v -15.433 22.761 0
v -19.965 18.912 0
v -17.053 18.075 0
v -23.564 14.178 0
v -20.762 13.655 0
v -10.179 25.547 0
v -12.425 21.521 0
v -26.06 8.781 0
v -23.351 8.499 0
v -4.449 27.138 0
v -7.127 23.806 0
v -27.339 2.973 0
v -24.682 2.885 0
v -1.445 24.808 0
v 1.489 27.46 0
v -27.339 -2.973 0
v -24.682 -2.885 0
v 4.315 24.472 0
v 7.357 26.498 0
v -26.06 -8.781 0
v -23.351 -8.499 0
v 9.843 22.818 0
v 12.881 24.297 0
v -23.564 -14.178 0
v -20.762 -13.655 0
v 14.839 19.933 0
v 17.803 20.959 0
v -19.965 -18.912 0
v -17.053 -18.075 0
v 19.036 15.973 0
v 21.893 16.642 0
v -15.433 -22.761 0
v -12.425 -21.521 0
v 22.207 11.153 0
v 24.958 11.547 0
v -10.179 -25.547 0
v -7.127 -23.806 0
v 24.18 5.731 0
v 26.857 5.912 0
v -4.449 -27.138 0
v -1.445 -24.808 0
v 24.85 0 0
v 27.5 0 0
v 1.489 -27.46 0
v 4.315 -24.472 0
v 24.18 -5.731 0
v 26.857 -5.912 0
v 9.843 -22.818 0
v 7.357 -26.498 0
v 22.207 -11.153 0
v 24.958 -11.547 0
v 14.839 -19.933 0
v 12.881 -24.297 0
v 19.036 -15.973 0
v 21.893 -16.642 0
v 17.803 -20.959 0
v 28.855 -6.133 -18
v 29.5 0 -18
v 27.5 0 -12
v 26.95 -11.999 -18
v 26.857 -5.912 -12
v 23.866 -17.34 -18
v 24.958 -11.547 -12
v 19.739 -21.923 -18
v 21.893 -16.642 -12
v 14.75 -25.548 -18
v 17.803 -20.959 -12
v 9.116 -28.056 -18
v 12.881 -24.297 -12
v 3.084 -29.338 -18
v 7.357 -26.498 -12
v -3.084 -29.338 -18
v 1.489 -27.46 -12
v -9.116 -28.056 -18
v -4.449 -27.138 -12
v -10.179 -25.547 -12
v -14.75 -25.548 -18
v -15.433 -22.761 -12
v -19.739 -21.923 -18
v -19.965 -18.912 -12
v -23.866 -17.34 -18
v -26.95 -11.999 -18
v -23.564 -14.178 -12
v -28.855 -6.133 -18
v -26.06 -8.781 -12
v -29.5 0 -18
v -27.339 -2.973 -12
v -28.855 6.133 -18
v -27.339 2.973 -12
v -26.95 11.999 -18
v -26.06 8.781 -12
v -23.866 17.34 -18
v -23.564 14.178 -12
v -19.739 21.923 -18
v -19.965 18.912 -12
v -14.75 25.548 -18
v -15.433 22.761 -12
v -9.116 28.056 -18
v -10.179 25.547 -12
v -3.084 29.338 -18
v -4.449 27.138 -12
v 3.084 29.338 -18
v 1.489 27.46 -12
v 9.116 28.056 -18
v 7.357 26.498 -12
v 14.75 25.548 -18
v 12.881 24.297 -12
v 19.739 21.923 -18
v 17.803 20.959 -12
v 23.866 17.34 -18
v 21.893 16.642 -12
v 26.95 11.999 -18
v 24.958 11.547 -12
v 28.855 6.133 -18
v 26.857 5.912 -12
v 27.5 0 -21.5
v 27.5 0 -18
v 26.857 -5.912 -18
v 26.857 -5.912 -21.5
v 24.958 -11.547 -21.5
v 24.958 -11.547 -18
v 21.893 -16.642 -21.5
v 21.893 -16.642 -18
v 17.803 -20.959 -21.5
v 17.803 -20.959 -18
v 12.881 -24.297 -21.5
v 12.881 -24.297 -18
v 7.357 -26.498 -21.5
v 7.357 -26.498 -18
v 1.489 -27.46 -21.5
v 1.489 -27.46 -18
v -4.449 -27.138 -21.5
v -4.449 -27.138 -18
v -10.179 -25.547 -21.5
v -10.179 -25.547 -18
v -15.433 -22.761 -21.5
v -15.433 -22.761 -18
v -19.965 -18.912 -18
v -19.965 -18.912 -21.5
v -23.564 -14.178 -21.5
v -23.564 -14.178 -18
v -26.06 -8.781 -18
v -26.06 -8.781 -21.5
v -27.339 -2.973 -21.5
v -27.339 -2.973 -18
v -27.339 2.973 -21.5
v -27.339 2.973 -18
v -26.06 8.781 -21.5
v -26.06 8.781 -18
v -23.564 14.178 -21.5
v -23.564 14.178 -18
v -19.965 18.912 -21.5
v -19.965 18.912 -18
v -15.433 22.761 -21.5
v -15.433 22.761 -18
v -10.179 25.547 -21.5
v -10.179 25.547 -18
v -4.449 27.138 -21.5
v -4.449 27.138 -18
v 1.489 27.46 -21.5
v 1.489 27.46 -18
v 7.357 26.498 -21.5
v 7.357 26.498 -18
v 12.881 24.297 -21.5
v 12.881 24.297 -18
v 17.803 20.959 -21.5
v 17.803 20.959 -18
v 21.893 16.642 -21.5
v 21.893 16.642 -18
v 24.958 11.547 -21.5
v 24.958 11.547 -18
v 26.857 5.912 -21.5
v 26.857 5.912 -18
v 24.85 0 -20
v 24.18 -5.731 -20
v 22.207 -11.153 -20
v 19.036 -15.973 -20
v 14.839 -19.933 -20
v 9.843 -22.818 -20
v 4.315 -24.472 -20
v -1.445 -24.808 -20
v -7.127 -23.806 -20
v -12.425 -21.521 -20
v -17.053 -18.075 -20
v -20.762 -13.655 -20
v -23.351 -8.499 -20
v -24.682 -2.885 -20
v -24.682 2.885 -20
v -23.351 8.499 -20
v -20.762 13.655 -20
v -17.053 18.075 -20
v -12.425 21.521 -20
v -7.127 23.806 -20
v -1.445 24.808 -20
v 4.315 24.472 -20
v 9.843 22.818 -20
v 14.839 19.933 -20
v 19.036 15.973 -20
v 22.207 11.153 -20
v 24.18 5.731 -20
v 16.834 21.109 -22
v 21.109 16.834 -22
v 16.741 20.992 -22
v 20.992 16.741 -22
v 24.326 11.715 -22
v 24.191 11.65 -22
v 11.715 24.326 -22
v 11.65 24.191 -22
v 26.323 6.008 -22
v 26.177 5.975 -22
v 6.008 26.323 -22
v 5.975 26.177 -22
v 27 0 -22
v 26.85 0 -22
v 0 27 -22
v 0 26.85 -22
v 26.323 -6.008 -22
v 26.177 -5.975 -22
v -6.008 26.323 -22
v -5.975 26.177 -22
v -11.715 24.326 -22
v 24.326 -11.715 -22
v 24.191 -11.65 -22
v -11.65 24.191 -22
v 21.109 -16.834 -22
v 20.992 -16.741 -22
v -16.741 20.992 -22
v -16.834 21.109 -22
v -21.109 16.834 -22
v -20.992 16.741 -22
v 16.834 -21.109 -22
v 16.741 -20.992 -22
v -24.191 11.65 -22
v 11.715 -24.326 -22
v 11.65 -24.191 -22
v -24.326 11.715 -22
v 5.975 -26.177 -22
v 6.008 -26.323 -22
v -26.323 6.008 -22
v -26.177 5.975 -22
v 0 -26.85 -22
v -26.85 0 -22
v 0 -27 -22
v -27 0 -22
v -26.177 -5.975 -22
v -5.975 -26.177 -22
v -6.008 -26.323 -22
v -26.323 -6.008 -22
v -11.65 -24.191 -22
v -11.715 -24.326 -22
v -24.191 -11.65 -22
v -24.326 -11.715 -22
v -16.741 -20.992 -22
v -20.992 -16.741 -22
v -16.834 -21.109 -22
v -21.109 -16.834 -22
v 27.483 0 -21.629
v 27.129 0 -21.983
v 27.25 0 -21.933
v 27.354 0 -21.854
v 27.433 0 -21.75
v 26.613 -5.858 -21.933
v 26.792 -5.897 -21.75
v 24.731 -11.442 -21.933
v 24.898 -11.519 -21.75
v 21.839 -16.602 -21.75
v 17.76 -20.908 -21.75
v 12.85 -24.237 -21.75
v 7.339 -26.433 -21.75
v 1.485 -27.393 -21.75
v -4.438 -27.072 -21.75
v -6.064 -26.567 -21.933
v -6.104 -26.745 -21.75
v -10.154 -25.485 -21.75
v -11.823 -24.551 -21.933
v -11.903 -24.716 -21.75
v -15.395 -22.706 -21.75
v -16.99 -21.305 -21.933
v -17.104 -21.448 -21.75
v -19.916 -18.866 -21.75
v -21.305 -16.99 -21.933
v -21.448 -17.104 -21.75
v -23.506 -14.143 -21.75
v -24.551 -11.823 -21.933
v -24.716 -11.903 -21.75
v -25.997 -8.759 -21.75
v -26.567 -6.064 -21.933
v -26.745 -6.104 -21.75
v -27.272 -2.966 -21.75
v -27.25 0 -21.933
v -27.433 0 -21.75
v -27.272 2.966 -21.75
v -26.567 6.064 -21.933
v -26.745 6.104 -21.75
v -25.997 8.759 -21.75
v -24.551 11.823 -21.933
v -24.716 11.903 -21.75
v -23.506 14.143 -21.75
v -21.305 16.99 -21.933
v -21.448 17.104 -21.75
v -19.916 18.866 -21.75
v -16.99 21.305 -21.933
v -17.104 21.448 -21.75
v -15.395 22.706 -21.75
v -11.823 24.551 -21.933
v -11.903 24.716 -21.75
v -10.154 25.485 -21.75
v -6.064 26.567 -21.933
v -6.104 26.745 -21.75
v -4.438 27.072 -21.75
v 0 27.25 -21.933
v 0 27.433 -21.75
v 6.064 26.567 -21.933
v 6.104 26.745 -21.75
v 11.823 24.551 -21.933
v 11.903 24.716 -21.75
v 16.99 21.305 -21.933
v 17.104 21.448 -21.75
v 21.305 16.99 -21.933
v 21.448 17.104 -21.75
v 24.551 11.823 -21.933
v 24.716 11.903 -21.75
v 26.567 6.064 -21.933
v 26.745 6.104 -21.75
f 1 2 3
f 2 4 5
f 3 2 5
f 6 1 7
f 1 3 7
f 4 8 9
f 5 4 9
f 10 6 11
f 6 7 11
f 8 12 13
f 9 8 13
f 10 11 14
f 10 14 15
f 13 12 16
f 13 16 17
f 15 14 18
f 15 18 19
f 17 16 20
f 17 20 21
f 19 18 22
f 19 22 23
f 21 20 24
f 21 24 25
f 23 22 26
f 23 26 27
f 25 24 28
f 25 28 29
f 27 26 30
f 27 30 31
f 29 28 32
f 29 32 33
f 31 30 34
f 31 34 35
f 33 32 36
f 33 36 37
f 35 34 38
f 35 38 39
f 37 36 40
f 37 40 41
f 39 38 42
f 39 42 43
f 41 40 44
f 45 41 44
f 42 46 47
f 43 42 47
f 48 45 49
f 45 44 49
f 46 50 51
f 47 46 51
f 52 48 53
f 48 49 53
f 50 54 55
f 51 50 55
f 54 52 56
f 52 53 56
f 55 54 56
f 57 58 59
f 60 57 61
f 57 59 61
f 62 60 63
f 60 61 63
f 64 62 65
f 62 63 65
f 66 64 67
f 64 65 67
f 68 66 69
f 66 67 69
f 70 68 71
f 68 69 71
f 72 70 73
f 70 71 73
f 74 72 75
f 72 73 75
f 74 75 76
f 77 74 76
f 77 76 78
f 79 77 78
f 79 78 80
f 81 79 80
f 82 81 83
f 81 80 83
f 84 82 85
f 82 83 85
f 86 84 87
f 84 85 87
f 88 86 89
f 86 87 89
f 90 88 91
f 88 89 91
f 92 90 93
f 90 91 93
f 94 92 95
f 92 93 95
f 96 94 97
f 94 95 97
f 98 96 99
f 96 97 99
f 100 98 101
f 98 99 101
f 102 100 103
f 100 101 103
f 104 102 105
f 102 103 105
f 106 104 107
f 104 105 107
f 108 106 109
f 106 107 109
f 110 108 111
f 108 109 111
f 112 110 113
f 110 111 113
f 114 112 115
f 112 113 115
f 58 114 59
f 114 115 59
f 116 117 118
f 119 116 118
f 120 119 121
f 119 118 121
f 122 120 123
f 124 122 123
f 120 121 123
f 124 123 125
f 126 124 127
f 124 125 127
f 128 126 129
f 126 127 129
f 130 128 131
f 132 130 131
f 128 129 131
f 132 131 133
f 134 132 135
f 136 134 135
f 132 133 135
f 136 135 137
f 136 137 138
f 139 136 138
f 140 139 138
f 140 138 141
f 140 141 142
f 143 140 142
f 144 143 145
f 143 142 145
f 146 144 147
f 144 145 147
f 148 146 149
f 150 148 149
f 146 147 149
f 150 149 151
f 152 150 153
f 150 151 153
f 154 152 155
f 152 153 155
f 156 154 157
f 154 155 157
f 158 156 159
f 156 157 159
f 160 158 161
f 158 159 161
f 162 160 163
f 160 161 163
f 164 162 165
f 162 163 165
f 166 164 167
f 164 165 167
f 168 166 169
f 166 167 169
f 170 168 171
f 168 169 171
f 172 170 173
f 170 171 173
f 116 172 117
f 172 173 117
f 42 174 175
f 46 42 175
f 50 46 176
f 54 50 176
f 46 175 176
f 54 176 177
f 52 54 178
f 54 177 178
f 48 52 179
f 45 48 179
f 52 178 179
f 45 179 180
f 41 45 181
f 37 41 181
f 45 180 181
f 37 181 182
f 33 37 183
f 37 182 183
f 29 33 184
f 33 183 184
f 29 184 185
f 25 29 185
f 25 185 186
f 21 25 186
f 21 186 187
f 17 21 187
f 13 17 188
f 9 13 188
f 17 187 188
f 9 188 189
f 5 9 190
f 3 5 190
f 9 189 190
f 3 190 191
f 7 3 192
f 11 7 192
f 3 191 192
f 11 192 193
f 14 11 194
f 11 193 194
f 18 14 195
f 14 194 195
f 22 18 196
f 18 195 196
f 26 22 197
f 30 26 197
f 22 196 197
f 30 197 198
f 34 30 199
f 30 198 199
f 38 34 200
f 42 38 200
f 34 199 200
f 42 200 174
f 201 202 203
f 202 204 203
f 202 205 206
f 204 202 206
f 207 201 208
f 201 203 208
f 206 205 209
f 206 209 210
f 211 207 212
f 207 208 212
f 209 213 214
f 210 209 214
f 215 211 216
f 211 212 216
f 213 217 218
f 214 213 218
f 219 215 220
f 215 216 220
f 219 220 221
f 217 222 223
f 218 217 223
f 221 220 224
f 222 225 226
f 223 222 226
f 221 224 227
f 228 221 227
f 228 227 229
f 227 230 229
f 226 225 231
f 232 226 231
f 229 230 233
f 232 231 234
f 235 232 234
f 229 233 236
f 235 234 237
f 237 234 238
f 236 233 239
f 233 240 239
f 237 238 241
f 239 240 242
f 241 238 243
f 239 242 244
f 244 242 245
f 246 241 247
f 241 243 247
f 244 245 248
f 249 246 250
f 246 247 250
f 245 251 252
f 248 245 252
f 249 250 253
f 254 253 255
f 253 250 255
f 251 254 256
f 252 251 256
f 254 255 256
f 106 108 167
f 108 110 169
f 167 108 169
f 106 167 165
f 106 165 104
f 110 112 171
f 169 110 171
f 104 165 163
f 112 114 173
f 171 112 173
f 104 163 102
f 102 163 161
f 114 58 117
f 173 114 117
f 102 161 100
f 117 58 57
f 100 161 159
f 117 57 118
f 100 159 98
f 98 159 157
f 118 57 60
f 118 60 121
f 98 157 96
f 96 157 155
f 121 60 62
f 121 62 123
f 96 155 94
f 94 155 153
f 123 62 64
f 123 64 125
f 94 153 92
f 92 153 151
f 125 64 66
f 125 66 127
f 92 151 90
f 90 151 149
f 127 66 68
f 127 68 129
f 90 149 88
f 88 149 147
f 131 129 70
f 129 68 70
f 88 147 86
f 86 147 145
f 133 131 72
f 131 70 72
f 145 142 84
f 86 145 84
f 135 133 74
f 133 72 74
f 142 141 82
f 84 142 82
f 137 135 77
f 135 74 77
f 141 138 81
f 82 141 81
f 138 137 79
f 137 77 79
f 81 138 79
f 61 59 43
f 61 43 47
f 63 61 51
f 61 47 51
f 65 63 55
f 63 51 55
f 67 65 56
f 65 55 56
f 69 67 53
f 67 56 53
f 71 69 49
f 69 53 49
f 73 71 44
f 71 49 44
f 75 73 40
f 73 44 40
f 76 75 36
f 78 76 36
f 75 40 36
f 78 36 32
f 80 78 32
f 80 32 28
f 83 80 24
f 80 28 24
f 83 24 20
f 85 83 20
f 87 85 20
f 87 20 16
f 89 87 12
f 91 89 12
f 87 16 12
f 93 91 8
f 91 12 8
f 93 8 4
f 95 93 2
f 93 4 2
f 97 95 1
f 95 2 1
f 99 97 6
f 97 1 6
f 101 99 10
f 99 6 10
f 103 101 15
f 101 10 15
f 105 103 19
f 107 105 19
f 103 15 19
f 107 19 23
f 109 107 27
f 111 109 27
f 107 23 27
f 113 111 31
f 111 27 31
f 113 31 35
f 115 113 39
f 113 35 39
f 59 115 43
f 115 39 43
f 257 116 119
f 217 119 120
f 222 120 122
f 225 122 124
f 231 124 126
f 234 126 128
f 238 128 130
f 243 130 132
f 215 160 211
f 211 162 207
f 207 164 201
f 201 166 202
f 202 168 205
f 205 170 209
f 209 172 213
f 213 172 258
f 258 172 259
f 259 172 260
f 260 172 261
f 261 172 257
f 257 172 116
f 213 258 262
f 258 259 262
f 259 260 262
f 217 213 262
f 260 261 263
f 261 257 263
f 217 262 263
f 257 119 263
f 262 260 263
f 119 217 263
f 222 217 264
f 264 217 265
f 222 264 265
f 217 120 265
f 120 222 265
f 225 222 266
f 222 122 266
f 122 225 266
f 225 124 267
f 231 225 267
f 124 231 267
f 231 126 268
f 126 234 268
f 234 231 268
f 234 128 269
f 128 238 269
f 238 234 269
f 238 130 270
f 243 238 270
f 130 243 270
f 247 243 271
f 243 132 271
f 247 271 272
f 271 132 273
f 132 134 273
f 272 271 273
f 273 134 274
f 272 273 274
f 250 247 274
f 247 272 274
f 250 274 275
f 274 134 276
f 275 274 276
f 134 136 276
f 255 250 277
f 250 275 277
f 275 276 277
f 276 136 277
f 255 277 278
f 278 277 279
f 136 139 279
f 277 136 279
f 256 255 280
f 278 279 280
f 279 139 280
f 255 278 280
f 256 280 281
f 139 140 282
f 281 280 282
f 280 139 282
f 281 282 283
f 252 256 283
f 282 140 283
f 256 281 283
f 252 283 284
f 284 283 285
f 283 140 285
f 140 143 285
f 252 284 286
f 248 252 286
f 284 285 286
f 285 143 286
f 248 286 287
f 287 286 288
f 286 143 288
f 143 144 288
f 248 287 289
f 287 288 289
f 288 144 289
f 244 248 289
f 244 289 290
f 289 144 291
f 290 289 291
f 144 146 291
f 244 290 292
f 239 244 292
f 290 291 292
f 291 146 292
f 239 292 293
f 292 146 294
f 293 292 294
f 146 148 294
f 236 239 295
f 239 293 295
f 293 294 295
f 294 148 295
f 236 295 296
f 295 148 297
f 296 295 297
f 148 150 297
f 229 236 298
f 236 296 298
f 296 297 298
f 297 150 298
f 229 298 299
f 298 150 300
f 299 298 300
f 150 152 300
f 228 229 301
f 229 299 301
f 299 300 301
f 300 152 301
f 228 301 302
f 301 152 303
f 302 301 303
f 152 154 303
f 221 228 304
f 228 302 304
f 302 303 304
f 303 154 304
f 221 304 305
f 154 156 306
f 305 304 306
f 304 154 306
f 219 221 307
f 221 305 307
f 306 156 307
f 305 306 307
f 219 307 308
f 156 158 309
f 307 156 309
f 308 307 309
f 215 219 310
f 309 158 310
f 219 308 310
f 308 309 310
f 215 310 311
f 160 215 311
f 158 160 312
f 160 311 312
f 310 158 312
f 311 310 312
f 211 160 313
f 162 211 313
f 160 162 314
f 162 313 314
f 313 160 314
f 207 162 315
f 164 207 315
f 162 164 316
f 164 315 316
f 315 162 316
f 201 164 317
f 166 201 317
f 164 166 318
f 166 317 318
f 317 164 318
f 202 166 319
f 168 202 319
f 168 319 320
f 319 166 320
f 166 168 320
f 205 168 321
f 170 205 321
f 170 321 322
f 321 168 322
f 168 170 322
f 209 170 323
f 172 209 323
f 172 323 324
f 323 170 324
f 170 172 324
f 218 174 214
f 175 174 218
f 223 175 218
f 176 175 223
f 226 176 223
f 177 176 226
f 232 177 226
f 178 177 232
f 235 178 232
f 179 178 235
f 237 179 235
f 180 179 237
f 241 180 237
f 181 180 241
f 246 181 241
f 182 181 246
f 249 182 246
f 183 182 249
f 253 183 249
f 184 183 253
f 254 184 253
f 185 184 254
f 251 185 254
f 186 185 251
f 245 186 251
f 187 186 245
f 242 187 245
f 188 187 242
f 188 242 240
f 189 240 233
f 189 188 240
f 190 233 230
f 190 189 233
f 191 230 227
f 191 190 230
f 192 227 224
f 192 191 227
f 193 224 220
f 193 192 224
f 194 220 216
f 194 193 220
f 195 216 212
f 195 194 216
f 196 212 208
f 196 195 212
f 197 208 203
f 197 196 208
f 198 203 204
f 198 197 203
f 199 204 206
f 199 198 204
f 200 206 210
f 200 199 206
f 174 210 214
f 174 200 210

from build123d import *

# Parameters (mm, degrees)
F2_R    = 0.5
F3_SIZE = 2


with BuildPart() as f1:
    # F0 (on Front) → F1 (revolve)
    with BuildSketch(Plane.XZ):
        Polygon((27.5, 0), (24.85, 0), (24.85, -22), (27.5, -22), (27.5, -18), (29.5, -18), (27.5, -12), align=None)
    revolve(axis=Axis((0, 0, -6.186577), (0, 0, -1)))

    # F2
    f2_edges = [f1.edges().sort_by_distance(p)[0] for p in [
        (-27.5, 0, -22),
    ]]
    fillet(f2_edges, radius=F2_R)

    # F3
    f3_edges = [f1.edges().sort_by_distance(p)[0] for p in [
        (-24.85, 0, -22),
    ]]
    chamfer(f3_edges, length=F3_SIZE)


solid = f1.part
